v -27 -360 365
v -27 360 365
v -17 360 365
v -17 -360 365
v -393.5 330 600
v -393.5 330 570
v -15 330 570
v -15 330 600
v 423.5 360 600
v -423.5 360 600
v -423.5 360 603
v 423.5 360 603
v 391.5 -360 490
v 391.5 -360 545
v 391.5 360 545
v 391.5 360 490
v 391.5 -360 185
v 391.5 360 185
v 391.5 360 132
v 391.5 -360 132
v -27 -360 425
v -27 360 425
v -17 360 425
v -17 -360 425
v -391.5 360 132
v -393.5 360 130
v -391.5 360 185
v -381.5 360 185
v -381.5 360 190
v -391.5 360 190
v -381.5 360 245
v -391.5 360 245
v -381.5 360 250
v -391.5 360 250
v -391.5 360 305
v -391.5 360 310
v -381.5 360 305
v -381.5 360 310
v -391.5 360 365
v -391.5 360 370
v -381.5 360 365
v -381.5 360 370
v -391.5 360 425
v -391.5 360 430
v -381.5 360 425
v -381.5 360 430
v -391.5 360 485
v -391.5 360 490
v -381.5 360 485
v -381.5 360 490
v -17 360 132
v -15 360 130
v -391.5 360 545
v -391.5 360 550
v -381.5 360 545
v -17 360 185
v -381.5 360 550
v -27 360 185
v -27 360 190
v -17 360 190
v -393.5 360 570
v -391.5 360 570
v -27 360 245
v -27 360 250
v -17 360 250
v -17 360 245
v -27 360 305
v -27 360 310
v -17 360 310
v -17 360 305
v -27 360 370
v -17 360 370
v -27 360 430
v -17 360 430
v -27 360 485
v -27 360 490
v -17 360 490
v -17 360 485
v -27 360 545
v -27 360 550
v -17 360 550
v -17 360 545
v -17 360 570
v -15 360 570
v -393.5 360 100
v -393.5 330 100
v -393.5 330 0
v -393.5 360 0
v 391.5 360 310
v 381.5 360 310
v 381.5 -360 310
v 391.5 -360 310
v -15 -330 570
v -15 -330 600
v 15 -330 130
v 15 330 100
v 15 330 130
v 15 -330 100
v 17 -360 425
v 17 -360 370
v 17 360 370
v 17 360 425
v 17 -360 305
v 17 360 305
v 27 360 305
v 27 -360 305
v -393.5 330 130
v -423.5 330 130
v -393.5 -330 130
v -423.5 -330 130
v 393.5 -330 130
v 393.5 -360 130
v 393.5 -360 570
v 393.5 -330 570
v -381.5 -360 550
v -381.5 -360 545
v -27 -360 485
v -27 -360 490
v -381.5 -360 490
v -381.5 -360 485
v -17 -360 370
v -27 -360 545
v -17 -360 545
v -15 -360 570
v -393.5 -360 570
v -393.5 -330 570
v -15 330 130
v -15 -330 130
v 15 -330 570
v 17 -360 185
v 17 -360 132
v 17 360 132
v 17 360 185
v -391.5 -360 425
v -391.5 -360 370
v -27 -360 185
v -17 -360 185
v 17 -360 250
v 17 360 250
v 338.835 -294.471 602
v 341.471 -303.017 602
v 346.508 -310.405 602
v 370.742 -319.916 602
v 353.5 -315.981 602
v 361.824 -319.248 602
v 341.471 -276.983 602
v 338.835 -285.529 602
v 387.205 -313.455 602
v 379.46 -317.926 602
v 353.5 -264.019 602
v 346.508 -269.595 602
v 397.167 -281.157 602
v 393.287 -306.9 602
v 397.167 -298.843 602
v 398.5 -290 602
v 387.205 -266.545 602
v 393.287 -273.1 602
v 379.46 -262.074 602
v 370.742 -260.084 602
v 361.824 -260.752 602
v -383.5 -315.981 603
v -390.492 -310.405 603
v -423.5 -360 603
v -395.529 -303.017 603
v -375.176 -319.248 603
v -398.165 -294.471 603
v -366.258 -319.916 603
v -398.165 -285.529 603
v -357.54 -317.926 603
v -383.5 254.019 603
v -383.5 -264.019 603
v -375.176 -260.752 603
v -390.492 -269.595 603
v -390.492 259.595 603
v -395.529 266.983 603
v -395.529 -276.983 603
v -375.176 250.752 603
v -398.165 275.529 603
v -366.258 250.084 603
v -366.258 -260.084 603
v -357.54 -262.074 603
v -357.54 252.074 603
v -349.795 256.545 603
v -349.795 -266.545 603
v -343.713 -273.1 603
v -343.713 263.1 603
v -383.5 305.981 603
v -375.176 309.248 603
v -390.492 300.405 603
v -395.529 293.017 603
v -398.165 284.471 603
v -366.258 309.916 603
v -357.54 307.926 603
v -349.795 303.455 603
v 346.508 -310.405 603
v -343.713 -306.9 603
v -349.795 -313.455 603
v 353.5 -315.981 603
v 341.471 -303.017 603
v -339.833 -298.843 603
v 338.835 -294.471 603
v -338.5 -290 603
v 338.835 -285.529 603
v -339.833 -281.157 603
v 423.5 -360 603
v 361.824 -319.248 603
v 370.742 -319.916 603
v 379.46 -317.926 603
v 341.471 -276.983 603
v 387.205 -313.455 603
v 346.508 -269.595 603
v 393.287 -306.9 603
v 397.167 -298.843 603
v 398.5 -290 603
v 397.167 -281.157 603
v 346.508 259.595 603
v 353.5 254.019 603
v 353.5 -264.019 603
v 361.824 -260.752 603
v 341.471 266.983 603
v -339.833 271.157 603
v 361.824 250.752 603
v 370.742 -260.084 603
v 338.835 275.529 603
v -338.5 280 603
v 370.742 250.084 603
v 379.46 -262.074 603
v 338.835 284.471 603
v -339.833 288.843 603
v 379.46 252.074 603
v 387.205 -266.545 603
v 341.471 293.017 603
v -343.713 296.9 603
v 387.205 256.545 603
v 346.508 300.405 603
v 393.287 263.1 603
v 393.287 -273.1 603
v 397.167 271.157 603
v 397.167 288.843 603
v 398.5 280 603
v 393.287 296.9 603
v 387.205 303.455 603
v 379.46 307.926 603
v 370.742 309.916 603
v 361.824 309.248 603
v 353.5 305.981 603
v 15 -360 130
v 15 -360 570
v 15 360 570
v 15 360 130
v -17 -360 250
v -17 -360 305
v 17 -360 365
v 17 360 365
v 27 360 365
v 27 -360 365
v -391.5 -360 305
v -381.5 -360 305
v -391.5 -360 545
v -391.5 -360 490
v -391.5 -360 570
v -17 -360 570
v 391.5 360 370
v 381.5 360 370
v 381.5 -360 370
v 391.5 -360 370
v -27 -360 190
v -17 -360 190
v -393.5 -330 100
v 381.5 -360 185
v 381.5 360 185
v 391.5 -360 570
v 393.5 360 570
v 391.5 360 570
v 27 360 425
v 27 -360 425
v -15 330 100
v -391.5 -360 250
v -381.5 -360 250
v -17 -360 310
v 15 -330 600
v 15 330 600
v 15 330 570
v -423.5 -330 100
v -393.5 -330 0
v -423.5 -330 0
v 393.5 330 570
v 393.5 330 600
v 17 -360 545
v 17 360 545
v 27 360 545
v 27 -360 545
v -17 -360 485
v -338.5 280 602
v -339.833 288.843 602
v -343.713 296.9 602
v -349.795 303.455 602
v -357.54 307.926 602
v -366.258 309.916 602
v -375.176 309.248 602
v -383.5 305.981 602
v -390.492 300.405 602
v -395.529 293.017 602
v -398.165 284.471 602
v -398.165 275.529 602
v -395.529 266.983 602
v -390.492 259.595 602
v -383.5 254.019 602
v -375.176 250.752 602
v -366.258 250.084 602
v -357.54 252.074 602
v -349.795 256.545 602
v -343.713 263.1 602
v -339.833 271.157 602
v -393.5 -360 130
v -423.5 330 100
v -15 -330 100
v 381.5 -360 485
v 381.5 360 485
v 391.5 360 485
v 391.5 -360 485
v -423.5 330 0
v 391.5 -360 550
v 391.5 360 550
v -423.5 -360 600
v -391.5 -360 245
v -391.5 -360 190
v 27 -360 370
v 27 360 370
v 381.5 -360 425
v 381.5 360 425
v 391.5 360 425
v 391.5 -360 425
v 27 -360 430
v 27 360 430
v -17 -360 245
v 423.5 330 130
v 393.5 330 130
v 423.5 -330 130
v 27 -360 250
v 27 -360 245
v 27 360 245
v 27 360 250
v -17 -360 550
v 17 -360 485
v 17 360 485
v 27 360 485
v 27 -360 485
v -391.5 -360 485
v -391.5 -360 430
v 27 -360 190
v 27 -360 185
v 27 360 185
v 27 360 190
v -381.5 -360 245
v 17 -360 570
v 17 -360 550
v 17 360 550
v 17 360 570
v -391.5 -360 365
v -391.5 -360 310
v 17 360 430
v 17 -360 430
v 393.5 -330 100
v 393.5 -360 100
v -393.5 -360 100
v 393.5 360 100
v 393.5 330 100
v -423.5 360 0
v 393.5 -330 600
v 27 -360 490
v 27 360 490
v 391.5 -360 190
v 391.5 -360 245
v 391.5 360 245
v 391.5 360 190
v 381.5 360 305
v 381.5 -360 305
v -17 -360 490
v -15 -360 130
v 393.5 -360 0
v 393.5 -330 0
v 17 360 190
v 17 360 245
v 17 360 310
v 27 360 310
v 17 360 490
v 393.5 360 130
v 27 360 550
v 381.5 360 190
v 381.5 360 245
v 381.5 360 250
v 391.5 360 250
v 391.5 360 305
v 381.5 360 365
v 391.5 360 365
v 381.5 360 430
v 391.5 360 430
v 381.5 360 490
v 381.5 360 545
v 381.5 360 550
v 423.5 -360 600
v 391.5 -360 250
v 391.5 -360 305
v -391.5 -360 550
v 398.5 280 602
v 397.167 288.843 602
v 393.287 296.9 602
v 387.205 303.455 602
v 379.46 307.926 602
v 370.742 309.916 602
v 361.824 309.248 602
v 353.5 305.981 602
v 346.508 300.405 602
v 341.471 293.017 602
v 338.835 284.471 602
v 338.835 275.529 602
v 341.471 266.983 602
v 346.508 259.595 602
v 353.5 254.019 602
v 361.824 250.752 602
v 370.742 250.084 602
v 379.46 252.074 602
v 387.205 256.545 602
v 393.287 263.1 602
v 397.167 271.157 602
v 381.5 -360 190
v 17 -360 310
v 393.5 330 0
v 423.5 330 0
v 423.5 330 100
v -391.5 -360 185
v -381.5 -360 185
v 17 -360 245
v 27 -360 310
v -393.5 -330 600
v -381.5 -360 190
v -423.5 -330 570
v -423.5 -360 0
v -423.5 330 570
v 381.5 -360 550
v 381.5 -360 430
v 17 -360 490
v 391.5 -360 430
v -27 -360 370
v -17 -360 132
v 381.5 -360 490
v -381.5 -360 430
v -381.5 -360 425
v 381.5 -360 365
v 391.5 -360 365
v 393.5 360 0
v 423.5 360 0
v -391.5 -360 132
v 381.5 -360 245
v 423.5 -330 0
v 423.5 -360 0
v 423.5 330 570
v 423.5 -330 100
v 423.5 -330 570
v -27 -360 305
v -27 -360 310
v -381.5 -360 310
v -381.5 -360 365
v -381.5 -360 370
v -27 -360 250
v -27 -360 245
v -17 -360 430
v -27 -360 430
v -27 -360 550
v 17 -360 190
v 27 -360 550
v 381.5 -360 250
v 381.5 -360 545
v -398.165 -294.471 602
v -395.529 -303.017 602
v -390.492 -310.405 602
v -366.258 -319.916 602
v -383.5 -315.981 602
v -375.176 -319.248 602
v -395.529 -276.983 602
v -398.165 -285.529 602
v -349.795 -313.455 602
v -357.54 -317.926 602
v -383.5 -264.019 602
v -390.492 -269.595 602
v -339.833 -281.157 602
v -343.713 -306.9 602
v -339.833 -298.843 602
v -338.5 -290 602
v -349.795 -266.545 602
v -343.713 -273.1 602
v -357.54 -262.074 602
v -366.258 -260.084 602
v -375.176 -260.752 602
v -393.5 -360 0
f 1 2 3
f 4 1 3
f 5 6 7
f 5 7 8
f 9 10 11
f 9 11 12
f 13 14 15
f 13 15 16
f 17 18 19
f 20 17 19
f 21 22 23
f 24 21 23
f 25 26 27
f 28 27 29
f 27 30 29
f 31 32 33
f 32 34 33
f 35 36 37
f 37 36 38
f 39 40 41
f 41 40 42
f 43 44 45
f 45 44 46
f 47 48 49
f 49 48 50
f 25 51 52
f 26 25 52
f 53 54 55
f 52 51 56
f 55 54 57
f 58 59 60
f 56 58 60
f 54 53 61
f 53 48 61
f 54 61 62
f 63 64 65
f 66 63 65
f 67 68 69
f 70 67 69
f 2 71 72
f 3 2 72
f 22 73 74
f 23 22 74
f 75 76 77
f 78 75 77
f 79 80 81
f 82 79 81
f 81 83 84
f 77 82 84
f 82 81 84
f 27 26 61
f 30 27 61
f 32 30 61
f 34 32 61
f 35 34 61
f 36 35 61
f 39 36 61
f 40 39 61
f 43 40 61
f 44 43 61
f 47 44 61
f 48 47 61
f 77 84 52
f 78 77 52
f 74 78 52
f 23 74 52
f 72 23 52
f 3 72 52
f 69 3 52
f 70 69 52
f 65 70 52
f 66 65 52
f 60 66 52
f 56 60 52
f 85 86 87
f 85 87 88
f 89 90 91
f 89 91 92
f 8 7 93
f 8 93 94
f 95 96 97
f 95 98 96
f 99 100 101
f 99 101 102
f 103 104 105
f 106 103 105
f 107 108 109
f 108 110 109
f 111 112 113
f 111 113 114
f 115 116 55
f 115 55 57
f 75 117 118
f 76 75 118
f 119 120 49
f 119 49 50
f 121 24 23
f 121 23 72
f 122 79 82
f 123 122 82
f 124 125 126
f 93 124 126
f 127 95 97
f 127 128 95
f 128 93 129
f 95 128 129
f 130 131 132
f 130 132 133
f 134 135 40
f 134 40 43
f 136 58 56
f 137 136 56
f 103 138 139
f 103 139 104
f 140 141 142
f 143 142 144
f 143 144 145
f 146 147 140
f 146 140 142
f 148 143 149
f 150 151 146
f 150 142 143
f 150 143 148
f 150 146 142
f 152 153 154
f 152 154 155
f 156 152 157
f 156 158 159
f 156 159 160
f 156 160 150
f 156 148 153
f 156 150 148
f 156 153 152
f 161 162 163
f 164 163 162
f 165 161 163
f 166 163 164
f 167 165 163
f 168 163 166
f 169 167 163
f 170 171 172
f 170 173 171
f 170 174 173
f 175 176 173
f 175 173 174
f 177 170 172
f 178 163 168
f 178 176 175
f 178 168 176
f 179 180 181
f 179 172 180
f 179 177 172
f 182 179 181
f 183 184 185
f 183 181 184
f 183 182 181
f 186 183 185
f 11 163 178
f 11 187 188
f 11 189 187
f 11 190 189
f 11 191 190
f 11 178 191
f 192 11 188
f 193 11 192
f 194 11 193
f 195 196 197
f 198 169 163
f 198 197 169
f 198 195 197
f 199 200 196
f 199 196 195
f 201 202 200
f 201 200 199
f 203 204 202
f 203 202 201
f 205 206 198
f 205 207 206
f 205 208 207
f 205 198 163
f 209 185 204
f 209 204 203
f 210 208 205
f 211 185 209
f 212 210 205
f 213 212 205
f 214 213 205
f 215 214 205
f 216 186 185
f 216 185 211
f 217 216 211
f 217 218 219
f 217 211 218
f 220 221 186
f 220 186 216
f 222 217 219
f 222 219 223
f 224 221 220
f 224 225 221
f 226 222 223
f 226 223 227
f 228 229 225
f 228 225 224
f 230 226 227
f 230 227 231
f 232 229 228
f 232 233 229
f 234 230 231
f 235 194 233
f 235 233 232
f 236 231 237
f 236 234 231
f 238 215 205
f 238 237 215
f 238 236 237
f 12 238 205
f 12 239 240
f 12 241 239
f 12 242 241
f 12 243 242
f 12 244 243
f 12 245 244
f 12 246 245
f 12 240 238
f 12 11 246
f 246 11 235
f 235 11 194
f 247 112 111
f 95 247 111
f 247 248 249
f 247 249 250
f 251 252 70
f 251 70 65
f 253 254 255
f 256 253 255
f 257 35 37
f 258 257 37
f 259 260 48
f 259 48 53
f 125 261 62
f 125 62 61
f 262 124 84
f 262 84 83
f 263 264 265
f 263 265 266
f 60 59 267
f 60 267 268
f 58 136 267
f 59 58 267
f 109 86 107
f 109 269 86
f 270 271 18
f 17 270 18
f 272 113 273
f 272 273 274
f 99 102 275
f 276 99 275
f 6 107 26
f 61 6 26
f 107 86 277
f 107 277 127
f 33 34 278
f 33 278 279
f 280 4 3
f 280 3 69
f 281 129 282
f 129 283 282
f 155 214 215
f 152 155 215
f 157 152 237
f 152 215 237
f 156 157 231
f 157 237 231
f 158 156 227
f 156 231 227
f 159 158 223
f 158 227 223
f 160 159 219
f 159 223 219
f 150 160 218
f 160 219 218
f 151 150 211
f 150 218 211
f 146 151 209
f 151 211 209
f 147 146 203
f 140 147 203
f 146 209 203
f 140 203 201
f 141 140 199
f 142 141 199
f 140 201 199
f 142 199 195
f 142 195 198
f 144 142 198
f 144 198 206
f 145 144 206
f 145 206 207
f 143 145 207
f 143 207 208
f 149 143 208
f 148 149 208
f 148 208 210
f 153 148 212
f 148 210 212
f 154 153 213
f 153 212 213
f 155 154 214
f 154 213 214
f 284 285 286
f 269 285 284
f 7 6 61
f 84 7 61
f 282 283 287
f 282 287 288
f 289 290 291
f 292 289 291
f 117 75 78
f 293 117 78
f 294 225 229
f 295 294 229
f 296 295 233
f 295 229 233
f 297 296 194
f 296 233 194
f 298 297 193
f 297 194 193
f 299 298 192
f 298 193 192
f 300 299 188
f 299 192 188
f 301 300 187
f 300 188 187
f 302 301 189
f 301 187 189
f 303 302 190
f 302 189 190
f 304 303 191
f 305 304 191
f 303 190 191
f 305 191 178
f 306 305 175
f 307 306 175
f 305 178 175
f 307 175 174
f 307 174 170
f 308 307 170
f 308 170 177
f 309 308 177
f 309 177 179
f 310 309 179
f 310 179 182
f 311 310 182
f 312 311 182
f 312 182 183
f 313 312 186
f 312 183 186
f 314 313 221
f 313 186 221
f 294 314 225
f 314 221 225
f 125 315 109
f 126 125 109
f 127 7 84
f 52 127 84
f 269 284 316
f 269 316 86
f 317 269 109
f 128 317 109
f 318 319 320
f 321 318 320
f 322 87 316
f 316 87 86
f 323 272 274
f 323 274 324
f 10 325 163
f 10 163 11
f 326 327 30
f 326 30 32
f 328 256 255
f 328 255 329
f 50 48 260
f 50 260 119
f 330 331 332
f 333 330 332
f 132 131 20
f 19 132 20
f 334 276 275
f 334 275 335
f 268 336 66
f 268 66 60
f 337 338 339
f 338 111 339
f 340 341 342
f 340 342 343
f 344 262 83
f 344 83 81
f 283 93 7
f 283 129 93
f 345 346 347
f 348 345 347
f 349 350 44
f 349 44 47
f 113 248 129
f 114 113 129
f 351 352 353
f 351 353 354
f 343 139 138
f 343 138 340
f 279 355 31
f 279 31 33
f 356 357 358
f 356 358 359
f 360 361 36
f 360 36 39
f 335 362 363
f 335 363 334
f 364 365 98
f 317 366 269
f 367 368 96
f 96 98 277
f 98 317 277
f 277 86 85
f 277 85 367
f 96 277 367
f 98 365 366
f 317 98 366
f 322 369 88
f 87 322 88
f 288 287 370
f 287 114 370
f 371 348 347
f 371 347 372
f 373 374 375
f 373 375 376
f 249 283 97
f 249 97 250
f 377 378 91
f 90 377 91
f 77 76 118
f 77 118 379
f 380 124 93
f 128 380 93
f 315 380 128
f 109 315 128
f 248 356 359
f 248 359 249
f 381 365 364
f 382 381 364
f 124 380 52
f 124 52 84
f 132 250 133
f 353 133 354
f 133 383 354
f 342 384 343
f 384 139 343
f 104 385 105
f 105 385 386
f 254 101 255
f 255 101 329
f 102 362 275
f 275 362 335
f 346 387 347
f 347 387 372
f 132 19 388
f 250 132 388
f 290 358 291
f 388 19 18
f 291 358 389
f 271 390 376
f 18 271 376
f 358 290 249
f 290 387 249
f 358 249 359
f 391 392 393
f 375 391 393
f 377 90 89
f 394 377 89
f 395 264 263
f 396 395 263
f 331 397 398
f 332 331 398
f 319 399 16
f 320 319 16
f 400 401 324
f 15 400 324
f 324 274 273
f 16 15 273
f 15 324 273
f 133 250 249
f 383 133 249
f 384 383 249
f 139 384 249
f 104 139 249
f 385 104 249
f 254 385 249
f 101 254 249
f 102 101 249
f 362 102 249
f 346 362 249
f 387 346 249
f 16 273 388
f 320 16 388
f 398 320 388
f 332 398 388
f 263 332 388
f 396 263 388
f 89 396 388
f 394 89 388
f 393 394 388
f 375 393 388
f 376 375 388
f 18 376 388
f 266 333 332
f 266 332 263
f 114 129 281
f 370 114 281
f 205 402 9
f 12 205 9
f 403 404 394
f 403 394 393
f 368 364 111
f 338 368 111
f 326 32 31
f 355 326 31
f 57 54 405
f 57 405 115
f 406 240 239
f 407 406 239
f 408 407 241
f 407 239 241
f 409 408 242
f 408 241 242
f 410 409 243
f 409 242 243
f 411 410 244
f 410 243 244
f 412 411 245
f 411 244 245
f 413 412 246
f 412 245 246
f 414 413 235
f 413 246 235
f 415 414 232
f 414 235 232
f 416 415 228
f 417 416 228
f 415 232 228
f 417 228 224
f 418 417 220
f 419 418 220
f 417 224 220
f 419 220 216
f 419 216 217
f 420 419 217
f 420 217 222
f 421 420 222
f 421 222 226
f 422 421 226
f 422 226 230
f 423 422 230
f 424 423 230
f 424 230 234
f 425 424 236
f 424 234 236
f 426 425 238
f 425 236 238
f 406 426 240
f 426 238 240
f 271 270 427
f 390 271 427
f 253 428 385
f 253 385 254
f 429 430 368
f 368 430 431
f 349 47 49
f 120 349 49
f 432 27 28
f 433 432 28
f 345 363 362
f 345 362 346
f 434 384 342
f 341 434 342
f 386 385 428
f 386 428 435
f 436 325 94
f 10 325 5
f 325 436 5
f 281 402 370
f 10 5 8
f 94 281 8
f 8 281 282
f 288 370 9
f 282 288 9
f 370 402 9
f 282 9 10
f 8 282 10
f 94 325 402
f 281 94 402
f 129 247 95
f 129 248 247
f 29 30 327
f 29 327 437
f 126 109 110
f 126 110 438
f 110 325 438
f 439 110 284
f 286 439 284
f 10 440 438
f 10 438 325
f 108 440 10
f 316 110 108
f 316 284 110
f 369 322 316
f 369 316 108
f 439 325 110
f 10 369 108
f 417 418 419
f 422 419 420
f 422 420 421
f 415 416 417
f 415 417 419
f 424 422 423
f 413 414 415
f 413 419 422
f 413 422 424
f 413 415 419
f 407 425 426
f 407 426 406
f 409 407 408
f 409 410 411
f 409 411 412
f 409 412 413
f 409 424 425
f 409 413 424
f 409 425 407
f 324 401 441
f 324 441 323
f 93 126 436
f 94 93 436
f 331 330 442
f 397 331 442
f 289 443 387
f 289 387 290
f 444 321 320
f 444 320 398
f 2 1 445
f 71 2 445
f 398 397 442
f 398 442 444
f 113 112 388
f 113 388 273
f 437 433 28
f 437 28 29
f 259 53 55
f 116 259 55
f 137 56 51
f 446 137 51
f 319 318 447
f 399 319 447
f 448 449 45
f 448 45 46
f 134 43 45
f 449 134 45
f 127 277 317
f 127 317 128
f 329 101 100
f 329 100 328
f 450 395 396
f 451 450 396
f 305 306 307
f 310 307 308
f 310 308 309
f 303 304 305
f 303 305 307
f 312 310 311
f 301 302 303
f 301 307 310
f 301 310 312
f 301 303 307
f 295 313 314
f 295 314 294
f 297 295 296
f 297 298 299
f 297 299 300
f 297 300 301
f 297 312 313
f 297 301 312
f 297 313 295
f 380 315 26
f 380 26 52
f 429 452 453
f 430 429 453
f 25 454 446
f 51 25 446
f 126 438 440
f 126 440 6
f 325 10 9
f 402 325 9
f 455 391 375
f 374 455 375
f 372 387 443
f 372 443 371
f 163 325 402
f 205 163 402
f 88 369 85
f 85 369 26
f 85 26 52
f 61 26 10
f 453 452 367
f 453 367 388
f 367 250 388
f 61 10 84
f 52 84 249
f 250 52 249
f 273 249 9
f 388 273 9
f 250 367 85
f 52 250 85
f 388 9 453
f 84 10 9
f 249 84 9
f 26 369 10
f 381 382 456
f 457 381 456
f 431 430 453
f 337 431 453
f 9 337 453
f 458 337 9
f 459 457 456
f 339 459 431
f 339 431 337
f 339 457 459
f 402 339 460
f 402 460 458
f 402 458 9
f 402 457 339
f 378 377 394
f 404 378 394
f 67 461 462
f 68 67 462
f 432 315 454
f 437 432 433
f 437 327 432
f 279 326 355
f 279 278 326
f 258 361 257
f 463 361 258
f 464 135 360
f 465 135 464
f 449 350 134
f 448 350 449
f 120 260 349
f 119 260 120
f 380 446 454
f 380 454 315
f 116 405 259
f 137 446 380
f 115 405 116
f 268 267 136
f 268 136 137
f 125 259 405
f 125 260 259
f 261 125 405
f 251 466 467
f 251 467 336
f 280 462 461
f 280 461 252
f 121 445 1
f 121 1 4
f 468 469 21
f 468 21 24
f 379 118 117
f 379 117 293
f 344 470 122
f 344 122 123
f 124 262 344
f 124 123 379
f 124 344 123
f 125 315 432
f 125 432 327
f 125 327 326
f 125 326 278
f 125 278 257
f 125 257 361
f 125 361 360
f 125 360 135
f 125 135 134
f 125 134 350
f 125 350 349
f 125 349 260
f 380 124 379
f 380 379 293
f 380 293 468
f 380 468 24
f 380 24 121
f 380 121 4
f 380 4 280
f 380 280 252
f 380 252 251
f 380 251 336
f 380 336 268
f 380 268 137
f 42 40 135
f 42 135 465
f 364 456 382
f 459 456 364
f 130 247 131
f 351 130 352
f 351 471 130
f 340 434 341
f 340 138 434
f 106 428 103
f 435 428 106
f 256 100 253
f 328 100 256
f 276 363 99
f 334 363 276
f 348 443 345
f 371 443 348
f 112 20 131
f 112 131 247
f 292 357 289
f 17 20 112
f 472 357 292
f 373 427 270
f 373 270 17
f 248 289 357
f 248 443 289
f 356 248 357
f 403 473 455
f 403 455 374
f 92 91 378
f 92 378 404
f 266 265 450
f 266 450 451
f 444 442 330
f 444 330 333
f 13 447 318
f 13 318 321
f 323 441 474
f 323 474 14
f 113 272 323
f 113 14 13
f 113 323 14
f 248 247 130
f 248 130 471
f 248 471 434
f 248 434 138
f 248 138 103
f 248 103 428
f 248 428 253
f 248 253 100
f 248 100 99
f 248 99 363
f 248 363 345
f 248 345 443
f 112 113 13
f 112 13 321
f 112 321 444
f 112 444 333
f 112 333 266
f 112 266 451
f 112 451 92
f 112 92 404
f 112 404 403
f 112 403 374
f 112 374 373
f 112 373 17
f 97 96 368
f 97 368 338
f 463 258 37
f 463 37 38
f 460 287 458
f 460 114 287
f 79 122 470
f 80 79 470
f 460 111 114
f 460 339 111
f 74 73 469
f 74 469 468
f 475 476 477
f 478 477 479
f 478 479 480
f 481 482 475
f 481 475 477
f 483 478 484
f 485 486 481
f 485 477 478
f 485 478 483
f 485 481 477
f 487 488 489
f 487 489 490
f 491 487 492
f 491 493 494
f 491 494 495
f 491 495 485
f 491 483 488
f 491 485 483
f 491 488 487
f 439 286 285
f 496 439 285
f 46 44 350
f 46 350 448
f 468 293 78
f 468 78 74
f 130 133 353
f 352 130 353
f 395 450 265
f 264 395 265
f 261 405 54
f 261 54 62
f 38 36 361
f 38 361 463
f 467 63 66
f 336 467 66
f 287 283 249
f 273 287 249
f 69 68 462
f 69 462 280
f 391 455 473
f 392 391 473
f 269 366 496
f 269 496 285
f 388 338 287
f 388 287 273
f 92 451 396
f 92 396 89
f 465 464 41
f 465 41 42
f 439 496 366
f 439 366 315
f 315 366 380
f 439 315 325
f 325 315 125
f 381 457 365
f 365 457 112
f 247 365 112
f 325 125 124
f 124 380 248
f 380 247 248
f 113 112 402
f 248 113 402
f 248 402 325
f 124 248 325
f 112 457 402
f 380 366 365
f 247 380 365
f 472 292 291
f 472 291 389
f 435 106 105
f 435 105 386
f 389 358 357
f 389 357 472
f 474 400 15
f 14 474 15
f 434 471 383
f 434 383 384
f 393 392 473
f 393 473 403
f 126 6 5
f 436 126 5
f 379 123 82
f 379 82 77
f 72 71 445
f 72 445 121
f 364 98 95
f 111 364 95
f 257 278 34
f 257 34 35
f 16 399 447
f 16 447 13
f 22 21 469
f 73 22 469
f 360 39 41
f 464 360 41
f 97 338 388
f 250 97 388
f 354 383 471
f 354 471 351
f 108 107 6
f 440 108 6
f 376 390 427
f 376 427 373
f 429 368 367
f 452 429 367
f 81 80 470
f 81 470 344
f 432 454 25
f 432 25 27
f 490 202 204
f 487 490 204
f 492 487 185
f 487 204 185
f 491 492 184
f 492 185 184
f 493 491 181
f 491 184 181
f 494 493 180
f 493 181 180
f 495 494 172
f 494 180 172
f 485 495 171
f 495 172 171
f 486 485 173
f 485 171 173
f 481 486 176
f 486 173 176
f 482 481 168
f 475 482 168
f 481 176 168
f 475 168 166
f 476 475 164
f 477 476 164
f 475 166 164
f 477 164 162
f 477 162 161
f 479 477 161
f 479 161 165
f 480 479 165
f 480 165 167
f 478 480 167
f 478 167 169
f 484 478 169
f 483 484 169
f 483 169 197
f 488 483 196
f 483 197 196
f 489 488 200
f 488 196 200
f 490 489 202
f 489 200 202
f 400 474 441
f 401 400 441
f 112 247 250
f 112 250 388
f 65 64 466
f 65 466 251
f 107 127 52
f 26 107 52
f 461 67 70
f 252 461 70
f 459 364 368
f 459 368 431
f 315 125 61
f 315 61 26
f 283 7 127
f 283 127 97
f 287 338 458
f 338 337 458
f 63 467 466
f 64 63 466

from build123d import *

# Parameters (mm, degrees)
F0_W           = 30
F0_H           = 30
F1_DEPTH       = 600
F2_W           = 30
F2_H           = 30
F3_DEPTH       = 393.5
F3_DEPTH_BACK  = 393.5
F4_W           = 30
F4_H           = 30
F5_DEPTH       = 330
F5_DEPTH_BACK  = 330
F6_W           = 847
F6_H           = 720
F7_DEPTH       = 3
F9_W           = 30
F9_H           = 30
F10_DEPTH      = 270
F10_DEPTH_BACK = 170
F11_W          = 374.5
F11_H          = 2
F12_DEPTH      = 720
F13_W          = 10
F13_H          = 5
F14_DEPTH      = 720
F15_R          = 30
F16_DEPTH      = 1


with BuildPart() as f1:
    # F0 (on Top) → F1 (new body)
    with BuildSketch(Plane.XY):
        with Locations((408.5, 345)):
            Rectangle(F0_W, F0_H)
        with Locations((408.5, -345)):
            Rectangle(F0_W, F0_H)
        with Locations((-408.5, 345)):
            Rectangle(F0_W, F0_H)
        with Locations((-408.5, -345)):
            Rectangle(F0_W, F0_H)
    extrude(amount=F1_DEPTH)

    # F2 (on Right) → F3 (join, two sides)
    with BuildSketch(Plane.YZ) as f3_sk:
        with Locations((345, 585)):
            Rectangle(F2_W, F2_H)
        with Locations((-345, 585)):
            Rectangle(F2_W, F2_H)
        with Locations((345, 115)):
            Rectangle(F2_W, F2_H)
        with Locations((-345, 115)):
            Rectangle(F2_W, F2_H)
    extrude(amount=F3_DEPTH)
    extrude(f3_sk.sketch, amount=-F3_DEPTH_BACK)

    # F4 (on Front) → F5 (join, two sides)
    with BuildSketch(Plane.XZ) as f5_sk:
        with Locations((408.5, 115)):
            Rectangle(F4_W, F4_H)
        with Locations((-408.5, 115)):
            Rectangle(F4_W, F4_H)
        with Locations((-408.5, 585)):
            Rectangle(F4_W, F4_H)
        with Locations((408.5, 585)):
            Rectangle(F4_W, F4_H)
        with Locations((0, 115)):
            Rectangle(F4_W, F4_H)
        with Locations((0, 585)):
            Rectangle(F4_W, F4_H)
    extrude(amount=F5_DEPTH)
    extrude(f5_sk.sketch, amount=-F5_DEPTH_BACK)

    # F9 (on offset) → F10 (join, two sides)
    with BuildSketch(Plane.XY.offset(300)) as f10_sk:
        with Locations((0, 345)):
            Rectangle(F9_W, F9_H)
        with Locations((0, -345)):
            Rectangle(F9_W, F9_H)
    extrude(amount=F10_DEPTH)
    extrude(f10_sk.sketch, amount=-F10_DEPTH_BACK)


with BuildPart() as f7:
    # F6 (on face) → F7 (new body)
    with BuildSketch(Plane.XY.offset(600)):
        Rectangle(F6_W, F6_H)
    extrude(amount=F7_DEPTH)

    # F15 (on face) → F16 (cut)
    with BuildSketch(Plane.XY.offset(603)):
        with Locations((-368.5, 280)):
            Circle(F15_R)
        with Locations((368.5, 280)):
            Circle(F15_R)
        with Locations((368.5, -290)):
            Circle(F15_R)
        with Locations((-368.5, -290)):
            Circle(F15_R)
    extrude(amount=-F16_DEPTH, mode=Mode.SUBTRACT)


with BuildPart() as f12:
    # F11 (on face) → F12 (new body)
    with BuildSketch(Plane.XZ.offset(360)):
        Polygon((-391.5, 570), (-393.5, 570), (-393.5, 130), (-391.5, 130), (-391.5, 132), align=None)
        with Locations((-204.25, 131)):
            Rectangle(F11_W, F11_H)
        Polygon((-17, 570), (-17, 132), (-17, 130), (-15, 130), (-15, 570), align=None)
        Polygon((17, 570), (15, 570), (15, 130), (17, 130), (17, 132), align=None)
        with Locations((204.25, 131)):
            Rectangle(F11_W, F11_H)
        Polygon((391.5, 570), (391.5, 132), (391.5, 130), (393.5, 130), (393.5, 570), align=None)
    extrude(amount=-F12_DEPTH)

    # F13 (on face) → F14 (join)
    with BuildSketch(Plane.XZ.offset(360)):
        with Locations((-386.5, 547.5)):
            Rectangle(F13_W, F13_H)
        with Locations((-386.5, 487.5)):
            Rectangle(F13_W, F13_H)
        with Locations((-386.5, 427.5)):
            Rectangle(F13_W, F13_H)
        with Locations((-386.5, 367.5)):
            Rectangle(F13_W, F13_H)
        with Locations((-386.5, 307.5)):
            Rectangle(F13_W, F13_H)
        with Locations((-386.5, 247.5)):
            Rectangle(F13_W, F13_H)
        with Locations((-386.5, 187.5)):
            Rectangle(F13_W, F13_H)
        with Locations((-22, 547.5)):
            Rectangle(F13_W, F13_H)
        with Locations((-22, 487.5)):
            Rectangle(F13_W, F13_H)
        with Locations((-22, 427.5)):
            Rectangle(F13_W, F13_H)
        with Locations((-22, 367.5)):
            Rectangle(F13_W, F13_H)
        with Locations((-22, 307.5)):
            Rectangle(F13_W, F13_H)
        with Locations((-22, 247.5)):
            Rectangle(F13_W, F13_H)
        with Locations((-22, 187.5)):
            Rectangle(F13_W, F13_H)
        with Locations((386.5, 187.5)):
            Rectangle(F13_W, F13_H)
        with Locations((22, 547.5)):
            Rectangle(F13_W, F13_H)
        with Locations((386.5, 547.5)):
            Rectangle(F13_W, F13_H)
        with Locations((22, 187.5)):
            Rectangle(F13_W, F13_H)
        with Locations((386.5, 487.5)):
            Rectangle(F13_W, F13_H)
        with Locations((22, 487.5)):
            Rectangle(F13_W, F13_H)
        with Locations((22, 247.5)):
            Rectangle(F13_W, F13_H)
        with Locations((22, 367.5)):
            Rectangle(F13_W, F13_H)
        with Locations((22, 307.5)):
            Rectangle(F13_W, F13_H)
        with Locations((386.5, 307.5)):
            Rectangle(F13_W, F13_H)
        with Locations((386.5, 247.5)):
            Rectangle(F13_W, F13_H)
        with Locations((22, 427.5)):
            Rectangle(F13_W, F13_H)
        with Locations((386.5, 367.5)):
            Rectangle(F13_W, F13_H)
        with Locations((386.5, 427.5)):
            Rectangle(F13_W, F13_H)
    extrude(amount=-F14_DEPTH)


solid = Compound([f1.part, f7.part, f12.part])
